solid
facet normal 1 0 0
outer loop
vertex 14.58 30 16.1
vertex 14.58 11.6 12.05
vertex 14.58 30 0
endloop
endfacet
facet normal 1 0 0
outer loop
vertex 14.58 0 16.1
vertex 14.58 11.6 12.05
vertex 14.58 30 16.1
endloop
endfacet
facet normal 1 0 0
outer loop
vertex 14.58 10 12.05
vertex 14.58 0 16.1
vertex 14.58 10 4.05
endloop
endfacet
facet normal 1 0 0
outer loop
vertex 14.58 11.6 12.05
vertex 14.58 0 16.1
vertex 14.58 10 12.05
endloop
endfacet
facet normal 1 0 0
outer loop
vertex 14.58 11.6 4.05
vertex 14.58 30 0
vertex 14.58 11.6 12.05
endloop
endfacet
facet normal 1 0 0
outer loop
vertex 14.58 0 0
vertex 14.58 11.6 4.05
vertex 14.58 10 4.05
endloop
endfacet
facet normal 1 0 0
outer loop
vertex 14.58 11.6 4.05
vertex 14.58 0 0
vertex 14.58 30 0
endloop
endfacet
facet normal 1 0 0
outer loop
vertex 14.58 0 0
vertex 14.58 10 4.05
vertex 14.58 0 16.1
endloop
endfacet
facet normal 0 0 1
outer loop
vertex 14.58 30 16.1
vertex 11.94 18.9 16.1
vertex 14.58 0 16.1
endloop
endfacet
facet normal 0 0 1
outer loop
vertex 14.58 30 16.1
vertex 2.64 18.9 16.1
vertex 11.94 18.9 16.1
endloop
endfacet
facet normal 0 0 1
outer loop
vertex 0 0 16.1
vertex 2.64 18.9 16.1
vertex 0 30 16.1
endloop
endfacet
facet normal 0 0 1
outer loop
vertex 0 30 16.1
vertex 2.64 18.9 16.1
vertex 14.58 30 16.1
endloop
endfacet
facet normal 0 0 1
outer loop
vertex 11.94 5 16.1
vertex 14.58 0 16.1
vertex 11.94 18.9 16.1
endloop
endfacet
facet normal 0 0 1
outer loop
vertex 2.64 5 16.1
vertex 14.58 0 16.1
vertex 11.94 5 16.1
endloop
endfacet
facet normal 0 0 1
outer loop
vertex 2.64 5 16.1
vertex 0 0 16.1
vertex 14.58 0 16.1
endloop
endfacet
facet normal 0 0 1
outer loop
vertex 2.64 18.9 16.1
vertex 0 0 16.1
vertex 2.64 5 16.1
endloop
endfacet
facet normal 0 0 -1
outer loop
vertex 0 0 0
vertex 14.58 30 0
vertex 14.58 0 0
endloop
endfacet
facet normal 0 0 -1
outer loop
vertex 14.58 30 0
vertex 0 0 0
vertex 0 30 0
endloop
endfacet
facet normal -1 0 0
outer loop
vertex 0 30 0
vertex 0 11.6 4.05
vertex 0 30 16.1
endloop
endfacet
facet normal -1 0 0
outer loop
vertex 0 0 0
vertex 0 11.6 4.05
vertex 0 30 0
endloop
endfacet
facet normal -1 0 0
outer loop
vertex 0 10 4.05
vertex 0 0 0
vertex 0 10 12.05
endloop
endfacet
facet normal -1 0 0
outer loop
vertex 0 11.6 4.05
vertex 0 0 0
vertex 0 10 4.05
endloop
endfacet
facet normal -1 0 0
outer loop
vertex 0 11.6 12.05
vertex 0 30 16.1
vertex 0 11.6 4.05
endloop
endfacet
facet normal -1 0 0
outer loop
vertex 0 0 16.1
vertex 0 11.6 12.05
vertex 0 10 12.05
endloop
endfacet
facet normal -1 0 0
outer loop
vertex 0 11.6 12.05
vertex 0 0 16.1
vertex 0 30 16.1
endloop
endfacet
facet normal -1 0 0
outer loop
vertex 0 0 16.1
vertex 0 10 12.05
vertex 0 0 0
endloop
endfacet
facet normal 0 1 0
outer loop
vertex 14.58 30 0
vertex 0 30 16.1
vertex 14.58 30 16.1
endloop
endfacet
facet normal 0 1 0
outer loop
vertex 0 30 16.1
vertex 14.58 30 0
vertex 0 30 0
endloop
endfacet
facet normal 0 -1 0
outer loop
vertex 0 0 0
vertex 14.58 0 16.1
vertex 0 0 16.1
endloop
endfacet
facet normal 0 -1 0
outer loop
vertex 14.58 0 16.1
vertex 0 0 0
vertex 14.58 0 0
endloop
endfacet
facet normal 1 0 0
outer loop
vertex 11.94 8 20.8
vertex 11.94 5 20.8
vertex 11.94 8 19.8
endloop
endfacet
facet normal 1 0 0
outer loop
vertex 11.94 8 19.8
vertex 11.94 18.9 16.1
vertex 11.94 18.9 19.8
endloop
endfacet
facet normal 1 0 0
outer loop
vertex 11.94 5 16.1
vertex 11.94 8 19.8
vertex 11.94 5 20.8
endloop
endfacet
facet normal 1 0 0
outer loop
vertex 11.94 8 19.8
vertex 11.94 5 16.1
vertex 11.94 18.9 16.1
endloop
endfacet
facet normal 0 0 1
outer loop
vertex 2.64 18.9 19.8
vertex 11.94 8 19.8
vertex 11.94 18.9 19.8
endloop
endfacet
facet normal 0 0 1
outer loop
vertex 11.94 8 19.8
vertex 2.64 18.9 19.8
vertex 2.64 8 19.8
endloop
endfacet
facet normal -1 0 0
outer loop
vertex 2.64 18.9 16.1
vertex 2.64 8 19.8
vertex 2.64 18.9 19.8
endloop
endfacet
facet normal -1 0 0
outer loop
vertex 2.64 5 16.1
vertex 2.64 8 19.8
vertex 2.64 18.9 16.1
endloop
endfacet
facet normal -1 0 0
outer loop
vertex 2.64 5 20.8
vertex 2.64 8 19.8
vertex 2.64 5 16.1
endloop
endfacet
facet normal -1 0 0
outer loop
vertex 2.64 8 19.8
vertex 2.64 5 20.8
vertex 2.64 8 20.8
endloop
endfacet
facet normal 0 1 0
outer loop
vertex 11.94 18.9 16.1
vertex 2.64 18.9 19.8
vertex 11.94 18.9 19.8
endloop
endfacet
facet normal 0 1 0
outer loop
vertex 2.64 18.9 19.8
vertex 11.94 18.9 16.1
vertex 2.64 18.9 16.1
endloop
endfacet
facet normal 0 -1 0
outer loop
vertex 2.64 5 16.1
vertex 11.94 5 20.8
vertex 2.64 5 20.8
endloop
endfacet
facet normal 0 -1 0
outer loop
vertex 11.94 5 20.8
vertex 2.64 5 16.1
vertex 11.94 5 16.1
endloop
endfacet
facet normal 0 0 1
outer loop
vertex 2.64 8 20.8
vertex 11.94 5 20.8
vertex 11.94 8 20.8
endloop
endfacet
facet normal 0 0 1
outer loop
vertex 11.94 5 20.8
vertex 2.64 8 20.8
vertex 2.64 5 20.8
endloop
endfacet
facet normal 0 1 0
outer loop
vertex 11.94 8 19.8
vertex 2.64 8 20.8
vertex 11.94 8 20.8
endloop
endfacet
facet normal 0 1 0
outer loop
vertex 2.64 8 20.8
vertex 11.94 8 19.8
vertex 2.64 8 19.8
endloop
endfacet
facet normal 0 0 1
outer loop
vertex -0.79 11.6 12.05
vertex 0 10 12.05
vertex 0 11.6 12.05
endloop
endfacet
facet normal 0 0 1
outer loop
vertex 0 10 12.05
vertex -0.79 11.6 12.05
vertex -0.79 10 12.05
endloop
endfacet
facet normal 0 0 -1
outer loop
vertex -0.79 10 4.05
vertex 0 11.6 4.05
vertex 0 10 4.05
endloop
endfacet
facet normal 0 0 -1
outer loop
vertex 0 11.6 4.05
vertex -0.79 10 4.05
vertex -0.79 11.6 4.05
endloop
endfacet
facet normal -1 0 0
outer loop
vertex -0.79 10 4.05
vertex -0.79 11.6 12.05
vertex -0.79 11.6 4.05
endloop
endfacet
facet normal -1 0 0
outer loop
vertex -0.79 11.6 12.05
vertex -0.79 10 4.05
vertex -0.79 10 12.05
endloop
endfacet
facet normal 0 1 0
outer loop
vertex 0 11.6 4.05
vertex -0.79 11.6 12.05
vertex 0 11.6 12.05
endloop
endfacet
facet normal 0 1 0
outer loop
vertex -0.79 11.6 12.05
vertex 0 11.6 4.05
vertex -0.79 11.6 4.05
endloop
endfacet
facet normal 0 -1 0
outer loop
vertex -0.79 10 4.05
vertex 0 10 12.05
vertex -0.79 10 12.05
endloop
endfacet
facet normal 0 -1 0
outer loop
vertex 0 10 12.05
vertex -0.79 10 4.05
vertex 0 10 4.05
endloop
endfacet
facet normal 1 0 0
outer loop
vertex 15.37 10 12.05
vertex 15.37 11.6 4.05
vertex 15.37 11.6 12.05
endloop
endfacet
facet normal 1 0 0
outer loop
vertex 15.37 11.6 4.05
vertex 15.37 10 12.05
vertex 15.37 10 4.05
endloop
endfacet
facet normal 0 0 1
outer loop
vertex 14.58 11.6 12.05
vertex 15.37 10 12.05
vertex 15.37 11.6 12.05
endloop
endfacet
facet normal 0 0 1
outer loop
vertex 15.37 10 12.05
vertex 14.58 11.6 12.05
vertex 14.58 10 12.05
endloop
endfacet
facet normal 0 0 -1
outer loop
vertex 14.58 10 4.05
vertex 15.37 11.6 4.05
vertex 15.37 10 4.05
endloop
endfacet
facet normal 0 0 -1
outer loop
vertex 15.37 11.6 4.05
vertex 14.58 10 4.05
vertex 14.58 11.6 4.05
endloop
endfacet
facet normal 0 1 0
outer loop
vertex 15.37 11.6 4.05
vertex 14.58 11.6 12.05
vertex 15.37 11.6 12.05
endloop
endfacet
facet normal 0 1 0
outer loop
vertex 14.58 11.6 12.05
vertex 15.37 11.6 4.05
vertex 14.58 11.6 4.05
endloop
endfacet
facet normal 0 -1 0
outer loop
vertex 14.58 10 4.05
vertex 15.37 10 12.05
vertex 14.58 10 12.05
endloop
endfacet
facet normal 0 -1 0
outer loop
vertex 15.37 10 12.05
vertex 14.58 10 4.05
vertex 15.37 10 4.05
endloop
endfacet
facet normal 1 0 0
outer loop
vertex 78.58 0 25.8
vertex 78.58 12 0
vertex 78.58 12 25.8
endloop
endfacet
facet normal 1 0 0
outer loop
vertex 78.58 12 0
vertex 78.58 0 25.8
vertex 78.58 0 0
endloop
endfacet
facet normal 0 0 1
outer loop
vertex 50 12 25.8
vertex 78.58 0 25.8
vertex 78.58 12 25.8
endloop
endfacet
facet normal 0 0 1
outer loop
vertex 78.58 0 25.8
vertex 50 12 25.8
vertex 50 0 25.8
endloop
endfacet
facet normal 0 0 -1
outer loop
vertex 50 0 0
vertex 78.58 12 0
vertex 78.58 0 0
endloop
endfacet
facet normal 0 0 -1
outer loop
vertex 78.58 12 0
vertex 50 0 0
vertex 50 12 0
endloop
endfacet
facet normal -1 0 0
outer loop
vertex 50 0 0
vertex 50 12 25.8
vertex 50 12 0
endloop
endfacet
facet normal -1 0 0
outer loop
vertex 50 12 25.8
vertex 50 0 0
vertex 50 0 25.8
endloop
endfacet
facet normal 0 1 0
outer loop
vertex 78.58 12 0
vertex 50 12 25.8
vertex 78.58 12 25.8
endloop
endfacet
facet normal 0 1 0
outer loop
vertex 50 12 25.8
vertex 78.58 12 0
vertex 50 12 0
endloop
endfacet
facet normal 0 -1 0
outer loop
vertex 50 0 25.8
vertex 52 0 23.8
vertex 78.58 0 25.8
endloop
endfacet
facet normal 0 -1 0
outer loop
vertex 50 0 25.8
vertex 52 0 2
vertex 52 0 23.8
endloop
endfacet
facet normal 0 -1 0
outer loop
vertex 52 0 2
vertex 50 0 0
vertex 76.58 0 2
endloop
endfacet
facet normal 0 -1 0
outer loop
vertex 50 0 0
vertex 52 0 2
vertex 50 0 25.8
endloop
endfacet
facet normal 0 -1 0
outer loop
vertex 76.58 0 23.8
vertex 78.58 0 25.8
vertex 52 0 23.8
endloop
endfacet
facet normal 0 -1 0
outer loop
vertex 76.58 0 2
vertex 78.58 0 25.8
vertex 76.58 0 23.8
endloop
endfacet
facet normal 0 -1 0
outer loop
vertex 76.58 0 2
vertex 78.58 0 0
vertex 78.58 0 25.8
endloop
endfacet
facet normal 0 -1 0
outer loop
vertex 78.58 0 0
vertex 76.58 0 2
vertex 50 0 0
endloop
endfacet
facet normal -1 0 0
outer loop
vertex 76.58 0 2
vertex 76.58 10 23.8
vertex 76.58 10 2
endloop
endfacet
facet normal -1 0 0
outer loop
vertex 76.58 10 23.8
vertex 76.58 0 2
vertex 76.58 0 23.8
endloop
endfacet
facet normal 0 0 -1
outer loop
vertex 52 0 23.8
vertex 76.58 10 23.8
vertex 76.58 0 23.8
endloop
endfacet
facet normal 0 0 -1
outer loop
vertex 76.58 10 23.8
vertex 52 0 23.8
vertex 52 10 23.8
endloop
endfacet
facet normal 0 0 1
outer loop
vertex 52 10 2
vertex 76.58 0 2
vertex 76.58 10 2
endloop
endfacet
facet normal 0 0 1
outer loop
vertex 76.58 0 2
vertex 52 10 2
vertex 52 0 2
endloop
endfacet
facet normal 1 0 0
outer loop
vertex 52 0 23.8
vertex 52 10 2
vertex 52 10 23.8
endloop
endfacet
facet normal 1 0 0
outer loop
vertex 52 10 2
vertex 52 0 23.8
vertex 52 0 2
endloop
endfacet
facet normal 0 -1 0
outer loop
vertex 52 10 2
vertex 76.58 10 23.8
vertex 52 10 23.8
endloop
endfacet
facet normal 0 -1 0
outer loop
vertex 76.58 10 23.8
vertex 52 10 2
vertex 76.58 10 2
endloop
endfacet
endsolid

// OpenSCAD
// file: keystone panel.scad
//keystone for the tray, for routing cables from switch to stuff in the back. Just a cheap amazon keystone.
//
//
//the keystone gets inserted from the rear of the panel, not the front, so the catch clips in, the front stopper should ride
//over the panel front when the catch is squished, then prevent the keystone from being pushed back into the tray.

/*
// next 2 lines used only by my 'on save' script. can be ignored otherwise.
// AUTO-V
version = "v0.1-2026/05/07r18";
*/

ks_width = 14.580;
ks_height = 16.10;
ks_depth = 30.0;
ks_catch_height = 3.7;
ks_catch_width = 9.3;
ks_catch_depth = 13.9;
ks_catch_ypos = 5.0;
ks_catch_edge_depth = 3.0; //the edge part is a tab that sticks up slightly more than the catch
ks_catch_edge_height = 1.0;
ks_side_lip_depth = 1.6;
ks_side_lip_height = 8.0;
ks_side_lip_ypos = 10.0;
ks_side_lip_width = (16.16 - ks_width) / 2;
//there is also a bottom lip, but the catch on top will squish and clip into the case, making the bottom lip a front stopper.
//using this keystone means the front panel is max 2mm thick.

//the panel recess for the keystones, this is because the keystones will otherwise protrude from the front panel.
ks_recess_height = ks_height + ks_catch_height + 2.0; //this is the overall height of the recess in the front panel.
ks_recess_width = ks_width + 10.0; //the overall width of the recess, for multiple this will need adjusting.
ks_recess_depth = ks_side_lip_depth; //how far to recess the keystone into the front panel.
ks_recess_wall_thickness = 2.0; //this is limited by the (ks_catch_ypos+ks_catch_edge_depth)-ks_side_lip_ypos. as the front panel needs to fit between them,

module keystone_panel_recess() {
    difference() {
        cube([ks_recess_width+(ks_recess_wall_thickness * 2), ks_side_lip_ypos+ks_recess_wall_thickness, ks_recess_height+(ks_recess_wall_thickness * 2)]);
        translate([ks_recess_wall_thickness, 0, ks_recess_wall_thickness]) {
            cube([ks_recess_width, ks_side_lip_ypos, ks_recess_height]);
        }
    }
}


module keystone() {
    color("green") {
        cube([ks_width, ks_depth, ks_height]);
    }
    // catch for the keystone to stop it falling out of the tray.
    translate([(ks_width - ks_catch_width)/2, ks_catch_ypos, ks_height]) {
        color("yellow") {
            cube([ks_catch_width, ks_catch_depth, ks_catch_height]);
        }
    }

    //catch edge 
    translate([(ks_width - ks_catch_width)/2, ks_catch_ypos , ks_height + ks_catch_height]) {
        color("yellow") {
            cube([ks_catch_width, ks_catch_edge_depth, ks_catch_edge_height]);
        }
    }


    // side lips for the keystone to help secure it in the tray. left side
    translate([-(ks_side_lip_width), ks_side_lip_ypos, (ks_height / 2)-(ks_side_lip_height/2)]) {
        color("orange") {
            cube([ks_side_lip_width, ks_side_lip_depth, ks_side_lip_height]);
        }
    }
    //right side
    translate([ks_width, ks_side_lip_ypos, (ks_height / 2)-(ks_side_lip_height/2)]) {
        color("orange") {
            cube([ks_side_lip_width, ks_side_lip_depth, ks_side_lip_height]);
        }
    }

}

render() {
    keystone();
    translate([50, 0, 0]) {
        keystone_panel_recess();
    }
}
// main file
// tray for a raspberry pi 5. the pi is inside and there is no need for direct port access, every needed port has a port extension to the front panel.


/*
// next 2 lines used only by my 'on save' script. can be ignored otherwise.
// AUTO-V
version = "v0.1-2026/05/15r04";
*/


rpi5_screw_hole_diameter = 2.7;


include <blank variable tray.scad>;
include <keystone panel.scad>;


c_show_rpi = false;

c_cutout_depth = 3;

c_eth_plug_width = 17;
c_eth_plug_height = 14.6;
c_eth_plug_depth = 1.5;
c_eth_plug_screw_dia = 4.2;
c_eth_plug_screw_dist = 27;

c_usbc_roundplug_dia = 22;

//my usb 2.0 ext panel mount socket is the same as the usb 3 one, so i use the same values
c_usb3_plug_screw_dist = 30;
c_usb3_screw_dia = 4.2;
c_usb3_plug_width = 16;
c_usb3_plug_height = 8;

c_rpi5_extension_width = 120;
c_rpi5_extension_height = 50;
c_rpi5_extension_panel_thickness = 2.2;

c_rpi5_extension_panel_shroud_thickness = 2;
c_rpi5_extension_panel_shroud_z = 4;
c_rpi5_extension_panel_base_length = 30; //how long along the base the extension is
c_rpi5_extension_panel_base_height = 10; //how high up the panel it goes

c_hdmi_plug_width = 16; //plug isn't square, but I am lazy
c_hdmi_plug_height = 6.5;
c_hdmi_plug_screw_dia = 4;
c_hdmi_plug_screw_dist = 26.5;


module eth_plug() {
    translate([-c_eth_plug_width/2, -c_eth_plug_height/2, -2.5]) {
        cube([c_eth_plug_width, c_eth_plug_height, c_cutout_depth * 2]);
    };
    translate([c_eth_plug_screw_dist/2, 0, 0]) {
        cylinder(d = c_eth_plug_screw_dia, h = c_cutout_depth * 2, center = true);
    };
    translate([-c_eth_plug_screw_dist/2, 0, 0]) {
        cylinder(d = c_eth_plug_screw_dia, h = c_cutout_depth * 2, center = true);
    };
};


module usbc_roundplug() {
    cylinder(d = c_usbc_roundplug_dia, h = c_cutout_depth * 2, center = true);
};


module usb3_plug() {
    translate([-c_usb3_plug_width/2, -c_usb3_plug_height/2, -2]) {
        cube([c_usb3_plug_width, c_usb3_plug_height, c_cutout_depth * 2]);
    };

    translate([c_usb3_plug_screw_dist/2, 0, 0]) {
        cylinder(d = c_usb3_screw_dia, h = c_cutout_depth * 2, center = true);
    };
    translate([-c_usb3_plug_screw_dist/2, 0, 0]) {
        cylinder(d = c_usb3_screw_dia, h = c_cutout_depth * 2, center = true);
    };
};


module hdmi_plug() {
    color("gray") {
        translate([-c_hdmi_plug_width/2, -c_hdmi_plug_height/2, -3]) {
            cube([c_hdmi_plug_width, c_hdmi_plug_height, c_cutout_depth * 2]);
        };

        translate([c_hdmi_plug_screw_dist/2, 0, 0]) {
            cylinder(d = c_hdmi_plug_screw_dia, h = c_cutout_depth * 2, center = true);
        };
        translate([-c_hdmi_plug_screw_dist/2, 0, 0]) {
            cylinder(d = c_hdmi_plug_screw_dia, h = c_cutout_depth * 2, center = true);
        };
    }
};

module rpi5_model() {
    //translate([42.5, 28, 6]) {
        //rotate([90, 0, 0]) {
            color("SlateBlue") {
                import("RASPBERRY_PI_5_WITH_ACTIVE_COOLER.stl");
            };
        //};
    //};
};


module standoff() {
    c_outer_dia = 6;
    c_height = 5;
    c_screw_dia = 2.2;
    c_screw_height = 5;
    
    difference() {
        cylinder(d = c_outer_dia, h = c_height, center = false);
        translate([0, 0, c_height-(c_screw_height+0.1)]) {
            cylinder(d = c_screw_dia, h = c_screw_height+0.2, center = false);
        };
    };
};


module standoffs() {
    
    pos_offset_x = 0;//8.5; //these have been disabled due to translating instead in the render
    pos_offset_y = 0;//7.5;
    pos_offset_z = 0; //5.0; //tray thickness
    x1 = 0+pos_offset_x;
    y1 = 0+pos_offset_y;
    x2 = 0+pos_offset_x;
    y2 = 49+pos_offset_y;
    x3 = 58+pos_offset_x;
    y3 = 0+pos_offset_y;
    x4 = 58+pos_offset_x;
    y4 = 49+pos_offset_y;

    translate([x1, y1, pos_offset_z]) {
        standoff();
    };
    translate([x2, y2, pos_offset_z]) {
        standoff();
    };
    translate([x3, y3, pos_offset_z]) {
        standoff();
    };
    translate([x4, y4, pos_offset_z]) {
        standoff();
    };
};


module panel_cutouts_for_rpi5() {
    translate([32, 2, 24]) {
        rotate([90, 90, 0]) {
            color("Gray") {
                hdmi_plug();
            }
        }
    }


    translate([57, 2, 24]) {
        rotate([90, 0, 0]) {
            color("Gray") {
                usbc_roundplug();
            }
        }
    }

    translate([80, -8, 12]) {
        //rotate([90, 0, 0]) {
            color("Gray") {
                keystone();
                //eth_plug();
            }
            translate([-1,10,0]){
                color("red") {
                    cube([17, 2, 20]);
                }
            }
        //}
    }

    translate([122, 2, 12]) {
        rotate([90, 0, 0]) {
            color("Gray") {
                usb3_plug();
            }
        }
    }

    translate([122, 2, 32]) {
        rotate([90, 0, 0]) {
            color("Gray") {
                usb3_plug();
            }
        }
    }

}

/**

module blank_variable_tray(
    panel_u_size            = 1, // front panel height in U
    tray_u_size             = undef, // side/base height in U. if undef, defaults to panel_u_size. if 0.6 is used, you can get 2 slides per side, 0.5 would only make the sides high enough for 1 slide
    tray_depth_scale        = 1, // 0 to 1, fraction of rack_width. 1 = full rack_width depth (330mm), 0.5 = rack_width/2 depth (165mm), etc.
    holes                   = 2, // mounting holes PER SIDE (2, 3, 4, or 6). I need to revisit this, as '2' would put 4 holes in each side of a 2U panel, but you might only want 2 each side (top/bottom)
    import_file             = "", //used for importing an SVG or STL/3MF onto the front panel face, see variable_front_panel_face_import() parameters below.
    import_type             = "none", //"svg", "stl", or "none"
    import_width            = 0, //if 0, defaults to 50% of the front panel inner width. used for imported SVGs and STLs/3MFs.
    import_height           = 0, //if 0, defaults to 50% of the front panel inner height. used for imported SVGs and STLs/3MFs.
    import_depth            = 0.8, //how far the imported design is embossed (positive) or engraved (negative). if 0, defaults to 0.8mm for SVGs, and 50% of the target width for STLs/3MFs.
    import_offset_x         = 0, //X offset for imported design from exact center of front panel. positive values move right, negative values move left.
    import_offset_z         = 0, //Z offset for imported design from exact center of front panel. positive values move up, negative values move down.
    import_mode             = "emboss", // "emboss" (raised from front face) or "engrave" (cut into front face)
    side_support            = 1, //0 or 1 to add gussets between front panel and sides when panel is taller than sides
    side_support_back       = 40, //how far back the gussets extend (mm)
    side_support_thickness  = 2.0, //normally the same as tray_side_thickness, but can be different if you want thinner gussets
    tray_side_thickness     = 2.0, //thickness of the tray side walls in mm.
    front_panel_thickness   = 3.0, //consider your screw lengths. 3mm is usually fine for m6x16 screws.
    back_panel              = 0, //0 or 1 to add a rear wall to make a drawer. rear wall height controlled by back_panel_height (in U).
    back_panel_thickness    = 2.0, //the rear wall thickness, if you have back_panel=1.
    back_panel_height       = 1.0, //in U units, converted to mm internally
    tray_thickness          = 5.0, //thickness of the tray base in mm.
    rack_width              = 330, //this is the external width of the rack, if single-width, using this and post_width is what determines the panel and tray widths and depths.
    post_width              = 15.875, //a normal single-width rack. If using double-width and/or sliders, this will be wider, but calculated automatically based on this.
    hole_d                  = 6.4, //holes sized for m6 screws, but slightly oversized for clearance.
    u_height                = 44.5, //standard U height in mm.
    hole_offset_z           = 12.7, //initial hole offset from the bottom panel/rack post in mm.
    hole_spacing            = 15.875, //spacing between holes in mm, standard U spacing.
    front_panel_undersizing = 0.1, //mm the front panel is undersized by on each edge to ensure it doesn't interfere with other panels
    front_panel_edge_radius = 2.0, //mm radius for front panel edges. set to 0 for sharp edges.
    tray_post_clearance     = 0.5, //0.5mm clearance, this makes 1mm total tray clearance. adjust as needed. modifying this might require tweaking the post_slide_cutout and hole_clearance to ensure the holes still clear properly.
    post_slide_width        = 3.0, //*these next 3 are for the slides that go into the posts on the rack.
    post_slide_cutout       = 3.2, //*ideally you should create a 1U post for testing the fit of these before printing everything.
    hole_clearance          = 0.3  //*you would be better off adjusting the post dimensions, rather than changing the tray dimensions, and create posts to fit the trays. making the side slides smaller to fit would make them weaker. So make the post cutouts bigger instead.
) {

**/
module rpi5_tray(rack_width = 330) {
    difference() {
        union() {
            blank_variable_tray(
                panel_u_size=1.0,
                tray_u_size=0.6,
                tray_depth_scale=0.9,
                holes=2,
                import_file="",
                import_type="none",
                import_width=50,
                import_height=50,
                import_depth=0,
                import_offset_x=0,
                import_offset_z=0,
                import_mode="emboss",
                side_support=1,
                side_support_back=80,
                side_support_thickness=3.0,
                tray_side_thickness=3.0,
                front_panel_thickness=3.0,
                back_panel=0,
                back_panel_thickness=2.0,
                back_panel_height=1.0,
                tray_thickness=5.0,
                rack_width=rack_width,
                post_width=15.875,
                hole_d=6.5, 
                u_height=44.5,
                hole_offset_z=12.7,
                hole_spacing=15.875,
                front_panel_undersizing=0.15,
                front_panel_edge_radius=2.0,
                tray_post_clearance=0.5,
                post_slide_width=3.0,
                post_slide_cutout=3.2
            );

            translate([120, 180, 5]) {
                rotate([0, 0, 90]) {
                    standoffs();
                    translate([19, 24.5, 5]) {
                        rotate([90, 0, 180]) {
                            rpi5_model();
                        }
                    }
                }
            }
        } //union

        panel_cutouts_for_rpi5();
    } //difference
}
